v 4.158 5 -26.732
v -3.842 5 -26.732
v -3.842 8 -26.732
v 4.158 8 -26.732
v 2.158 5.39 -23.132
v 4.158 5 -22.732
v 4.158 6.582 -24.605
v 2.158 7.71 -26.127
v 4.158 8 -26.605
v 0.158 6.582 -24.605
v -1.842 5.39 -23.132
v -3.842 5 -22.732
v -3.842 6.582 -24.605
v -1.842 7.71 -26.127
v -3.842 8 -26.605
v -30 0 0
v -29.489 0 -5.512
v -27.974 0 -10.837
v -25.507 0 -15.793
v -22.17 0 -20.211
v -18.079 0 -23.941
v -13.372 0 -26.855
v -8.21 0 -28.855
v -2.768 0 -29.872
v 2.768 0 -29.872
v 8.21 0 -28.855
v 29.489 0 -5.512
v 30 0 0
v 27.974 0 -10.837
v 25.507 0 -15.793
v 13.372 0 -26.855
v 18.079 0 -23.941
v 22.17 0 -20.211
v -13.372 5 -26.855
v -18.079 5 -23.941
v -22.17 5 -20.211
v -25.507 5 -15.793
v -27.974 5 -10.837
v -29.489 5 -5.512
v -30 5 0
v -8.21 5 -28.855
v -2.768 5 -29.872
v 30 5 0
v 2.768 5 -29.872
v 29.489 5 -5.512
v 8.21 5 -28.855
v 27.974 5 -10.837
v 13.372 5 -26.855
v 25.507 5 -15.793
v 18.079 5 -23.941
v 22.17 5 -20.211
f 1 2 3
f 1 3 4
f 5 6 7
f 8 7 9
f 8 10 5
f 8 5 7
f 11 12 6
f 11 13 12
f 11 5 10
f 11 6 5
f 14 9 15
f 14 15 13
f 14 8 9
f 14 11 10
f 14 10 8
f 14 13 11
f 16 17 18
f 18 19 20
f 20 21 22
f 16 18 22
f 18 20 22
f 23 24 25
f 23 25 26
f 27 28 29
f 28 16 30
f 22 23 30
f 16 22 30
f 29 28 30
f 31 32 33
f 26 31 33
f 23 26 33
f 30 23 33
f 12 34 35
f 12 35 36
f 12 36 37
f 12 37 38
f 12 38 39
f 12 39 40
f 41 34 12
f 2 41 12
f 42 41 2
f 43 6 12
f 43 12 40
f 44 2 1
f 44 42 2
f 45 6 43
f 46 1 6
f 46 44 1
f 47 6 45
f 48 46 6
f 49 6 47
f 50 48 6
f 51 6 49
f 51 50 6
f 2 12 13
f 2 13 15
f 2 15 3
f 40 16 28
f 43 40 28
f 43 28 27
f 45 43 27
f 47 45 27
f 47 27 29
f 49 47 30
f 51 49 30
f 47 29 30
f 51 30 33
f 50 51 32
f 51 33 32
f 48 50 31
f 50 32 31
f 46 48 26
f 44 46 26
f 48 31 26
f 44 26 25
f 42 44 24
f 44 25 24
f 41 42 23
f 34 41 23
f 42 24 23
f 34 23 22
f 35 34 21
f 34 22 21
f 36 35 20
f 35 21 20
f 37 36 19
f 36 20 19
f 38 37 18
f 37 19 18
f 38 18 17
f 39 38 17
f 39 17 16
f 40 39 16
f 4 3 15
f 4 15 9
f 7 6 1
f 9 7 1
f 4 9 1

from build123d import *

# Parameters (mm, degrees)
BOSS_EXTRUDE1_DEPTH = 5
SKETCH3_W           = 8
SKETCH3_H           = 4
BOSS_EXTRUDE2_DEPTH = 3
FILLET1_START       = -3.841593316
FILLET1_DEPTH       = 8


with BuildPart() as part:
    # Sketch1 → Boss-Extrude1 (new body)
    with BuildSketch(Plane(origin=(0, 0, 0), x_dir=(1, 0, 0), z_dir=(0, 1, 0))):
        with BuildLine():
            Line((-30, 0), (30, 0))
            ThreePointArc((30, 0), (0, 30), (-30, 0))
        make_face()
    extrude(amount=BOSS_EXTRUDE1_DEPTH)

    # Sketch3 → Boss-Extrude2 (add)
    with BuildSketch(Plane(origin=(0, 5, 0), x_dir=(1, 0, 0), z_dir=(0, 1, 0))):
        with Locations((0.158406684, 24.731666579)):
            Rectangle(SKETCH3_W, SKETCH3_H)
    extrude(amount=BOSS_EXTRUDE2_DEPTH)

    # Fillet1: read off the stored shape, not the designer's step
    # Fillet1 outline → Fillet1 (cut)
    with BuildSketch(Plane.YZ.offset(FILLET1_START)):
        with BuildLine():
            Line((8, -22.731666579), (5, -22.731666579))
            add(Edge.make_bspline(
                [(5, -22.731666579), (8, -23.506263249), (8, -26.604649926)],
                knots=[0, 0, 0, 1, 1, 1], degree=2, weights=[1, 0.057495957, 1]))
            Line((8, -26.604649926), (8, -22.731666579))
        make_face()
    extrude(amount=FILLET1_DEPTH, mode=Mode.SUBTRACT)


solid = part.part
